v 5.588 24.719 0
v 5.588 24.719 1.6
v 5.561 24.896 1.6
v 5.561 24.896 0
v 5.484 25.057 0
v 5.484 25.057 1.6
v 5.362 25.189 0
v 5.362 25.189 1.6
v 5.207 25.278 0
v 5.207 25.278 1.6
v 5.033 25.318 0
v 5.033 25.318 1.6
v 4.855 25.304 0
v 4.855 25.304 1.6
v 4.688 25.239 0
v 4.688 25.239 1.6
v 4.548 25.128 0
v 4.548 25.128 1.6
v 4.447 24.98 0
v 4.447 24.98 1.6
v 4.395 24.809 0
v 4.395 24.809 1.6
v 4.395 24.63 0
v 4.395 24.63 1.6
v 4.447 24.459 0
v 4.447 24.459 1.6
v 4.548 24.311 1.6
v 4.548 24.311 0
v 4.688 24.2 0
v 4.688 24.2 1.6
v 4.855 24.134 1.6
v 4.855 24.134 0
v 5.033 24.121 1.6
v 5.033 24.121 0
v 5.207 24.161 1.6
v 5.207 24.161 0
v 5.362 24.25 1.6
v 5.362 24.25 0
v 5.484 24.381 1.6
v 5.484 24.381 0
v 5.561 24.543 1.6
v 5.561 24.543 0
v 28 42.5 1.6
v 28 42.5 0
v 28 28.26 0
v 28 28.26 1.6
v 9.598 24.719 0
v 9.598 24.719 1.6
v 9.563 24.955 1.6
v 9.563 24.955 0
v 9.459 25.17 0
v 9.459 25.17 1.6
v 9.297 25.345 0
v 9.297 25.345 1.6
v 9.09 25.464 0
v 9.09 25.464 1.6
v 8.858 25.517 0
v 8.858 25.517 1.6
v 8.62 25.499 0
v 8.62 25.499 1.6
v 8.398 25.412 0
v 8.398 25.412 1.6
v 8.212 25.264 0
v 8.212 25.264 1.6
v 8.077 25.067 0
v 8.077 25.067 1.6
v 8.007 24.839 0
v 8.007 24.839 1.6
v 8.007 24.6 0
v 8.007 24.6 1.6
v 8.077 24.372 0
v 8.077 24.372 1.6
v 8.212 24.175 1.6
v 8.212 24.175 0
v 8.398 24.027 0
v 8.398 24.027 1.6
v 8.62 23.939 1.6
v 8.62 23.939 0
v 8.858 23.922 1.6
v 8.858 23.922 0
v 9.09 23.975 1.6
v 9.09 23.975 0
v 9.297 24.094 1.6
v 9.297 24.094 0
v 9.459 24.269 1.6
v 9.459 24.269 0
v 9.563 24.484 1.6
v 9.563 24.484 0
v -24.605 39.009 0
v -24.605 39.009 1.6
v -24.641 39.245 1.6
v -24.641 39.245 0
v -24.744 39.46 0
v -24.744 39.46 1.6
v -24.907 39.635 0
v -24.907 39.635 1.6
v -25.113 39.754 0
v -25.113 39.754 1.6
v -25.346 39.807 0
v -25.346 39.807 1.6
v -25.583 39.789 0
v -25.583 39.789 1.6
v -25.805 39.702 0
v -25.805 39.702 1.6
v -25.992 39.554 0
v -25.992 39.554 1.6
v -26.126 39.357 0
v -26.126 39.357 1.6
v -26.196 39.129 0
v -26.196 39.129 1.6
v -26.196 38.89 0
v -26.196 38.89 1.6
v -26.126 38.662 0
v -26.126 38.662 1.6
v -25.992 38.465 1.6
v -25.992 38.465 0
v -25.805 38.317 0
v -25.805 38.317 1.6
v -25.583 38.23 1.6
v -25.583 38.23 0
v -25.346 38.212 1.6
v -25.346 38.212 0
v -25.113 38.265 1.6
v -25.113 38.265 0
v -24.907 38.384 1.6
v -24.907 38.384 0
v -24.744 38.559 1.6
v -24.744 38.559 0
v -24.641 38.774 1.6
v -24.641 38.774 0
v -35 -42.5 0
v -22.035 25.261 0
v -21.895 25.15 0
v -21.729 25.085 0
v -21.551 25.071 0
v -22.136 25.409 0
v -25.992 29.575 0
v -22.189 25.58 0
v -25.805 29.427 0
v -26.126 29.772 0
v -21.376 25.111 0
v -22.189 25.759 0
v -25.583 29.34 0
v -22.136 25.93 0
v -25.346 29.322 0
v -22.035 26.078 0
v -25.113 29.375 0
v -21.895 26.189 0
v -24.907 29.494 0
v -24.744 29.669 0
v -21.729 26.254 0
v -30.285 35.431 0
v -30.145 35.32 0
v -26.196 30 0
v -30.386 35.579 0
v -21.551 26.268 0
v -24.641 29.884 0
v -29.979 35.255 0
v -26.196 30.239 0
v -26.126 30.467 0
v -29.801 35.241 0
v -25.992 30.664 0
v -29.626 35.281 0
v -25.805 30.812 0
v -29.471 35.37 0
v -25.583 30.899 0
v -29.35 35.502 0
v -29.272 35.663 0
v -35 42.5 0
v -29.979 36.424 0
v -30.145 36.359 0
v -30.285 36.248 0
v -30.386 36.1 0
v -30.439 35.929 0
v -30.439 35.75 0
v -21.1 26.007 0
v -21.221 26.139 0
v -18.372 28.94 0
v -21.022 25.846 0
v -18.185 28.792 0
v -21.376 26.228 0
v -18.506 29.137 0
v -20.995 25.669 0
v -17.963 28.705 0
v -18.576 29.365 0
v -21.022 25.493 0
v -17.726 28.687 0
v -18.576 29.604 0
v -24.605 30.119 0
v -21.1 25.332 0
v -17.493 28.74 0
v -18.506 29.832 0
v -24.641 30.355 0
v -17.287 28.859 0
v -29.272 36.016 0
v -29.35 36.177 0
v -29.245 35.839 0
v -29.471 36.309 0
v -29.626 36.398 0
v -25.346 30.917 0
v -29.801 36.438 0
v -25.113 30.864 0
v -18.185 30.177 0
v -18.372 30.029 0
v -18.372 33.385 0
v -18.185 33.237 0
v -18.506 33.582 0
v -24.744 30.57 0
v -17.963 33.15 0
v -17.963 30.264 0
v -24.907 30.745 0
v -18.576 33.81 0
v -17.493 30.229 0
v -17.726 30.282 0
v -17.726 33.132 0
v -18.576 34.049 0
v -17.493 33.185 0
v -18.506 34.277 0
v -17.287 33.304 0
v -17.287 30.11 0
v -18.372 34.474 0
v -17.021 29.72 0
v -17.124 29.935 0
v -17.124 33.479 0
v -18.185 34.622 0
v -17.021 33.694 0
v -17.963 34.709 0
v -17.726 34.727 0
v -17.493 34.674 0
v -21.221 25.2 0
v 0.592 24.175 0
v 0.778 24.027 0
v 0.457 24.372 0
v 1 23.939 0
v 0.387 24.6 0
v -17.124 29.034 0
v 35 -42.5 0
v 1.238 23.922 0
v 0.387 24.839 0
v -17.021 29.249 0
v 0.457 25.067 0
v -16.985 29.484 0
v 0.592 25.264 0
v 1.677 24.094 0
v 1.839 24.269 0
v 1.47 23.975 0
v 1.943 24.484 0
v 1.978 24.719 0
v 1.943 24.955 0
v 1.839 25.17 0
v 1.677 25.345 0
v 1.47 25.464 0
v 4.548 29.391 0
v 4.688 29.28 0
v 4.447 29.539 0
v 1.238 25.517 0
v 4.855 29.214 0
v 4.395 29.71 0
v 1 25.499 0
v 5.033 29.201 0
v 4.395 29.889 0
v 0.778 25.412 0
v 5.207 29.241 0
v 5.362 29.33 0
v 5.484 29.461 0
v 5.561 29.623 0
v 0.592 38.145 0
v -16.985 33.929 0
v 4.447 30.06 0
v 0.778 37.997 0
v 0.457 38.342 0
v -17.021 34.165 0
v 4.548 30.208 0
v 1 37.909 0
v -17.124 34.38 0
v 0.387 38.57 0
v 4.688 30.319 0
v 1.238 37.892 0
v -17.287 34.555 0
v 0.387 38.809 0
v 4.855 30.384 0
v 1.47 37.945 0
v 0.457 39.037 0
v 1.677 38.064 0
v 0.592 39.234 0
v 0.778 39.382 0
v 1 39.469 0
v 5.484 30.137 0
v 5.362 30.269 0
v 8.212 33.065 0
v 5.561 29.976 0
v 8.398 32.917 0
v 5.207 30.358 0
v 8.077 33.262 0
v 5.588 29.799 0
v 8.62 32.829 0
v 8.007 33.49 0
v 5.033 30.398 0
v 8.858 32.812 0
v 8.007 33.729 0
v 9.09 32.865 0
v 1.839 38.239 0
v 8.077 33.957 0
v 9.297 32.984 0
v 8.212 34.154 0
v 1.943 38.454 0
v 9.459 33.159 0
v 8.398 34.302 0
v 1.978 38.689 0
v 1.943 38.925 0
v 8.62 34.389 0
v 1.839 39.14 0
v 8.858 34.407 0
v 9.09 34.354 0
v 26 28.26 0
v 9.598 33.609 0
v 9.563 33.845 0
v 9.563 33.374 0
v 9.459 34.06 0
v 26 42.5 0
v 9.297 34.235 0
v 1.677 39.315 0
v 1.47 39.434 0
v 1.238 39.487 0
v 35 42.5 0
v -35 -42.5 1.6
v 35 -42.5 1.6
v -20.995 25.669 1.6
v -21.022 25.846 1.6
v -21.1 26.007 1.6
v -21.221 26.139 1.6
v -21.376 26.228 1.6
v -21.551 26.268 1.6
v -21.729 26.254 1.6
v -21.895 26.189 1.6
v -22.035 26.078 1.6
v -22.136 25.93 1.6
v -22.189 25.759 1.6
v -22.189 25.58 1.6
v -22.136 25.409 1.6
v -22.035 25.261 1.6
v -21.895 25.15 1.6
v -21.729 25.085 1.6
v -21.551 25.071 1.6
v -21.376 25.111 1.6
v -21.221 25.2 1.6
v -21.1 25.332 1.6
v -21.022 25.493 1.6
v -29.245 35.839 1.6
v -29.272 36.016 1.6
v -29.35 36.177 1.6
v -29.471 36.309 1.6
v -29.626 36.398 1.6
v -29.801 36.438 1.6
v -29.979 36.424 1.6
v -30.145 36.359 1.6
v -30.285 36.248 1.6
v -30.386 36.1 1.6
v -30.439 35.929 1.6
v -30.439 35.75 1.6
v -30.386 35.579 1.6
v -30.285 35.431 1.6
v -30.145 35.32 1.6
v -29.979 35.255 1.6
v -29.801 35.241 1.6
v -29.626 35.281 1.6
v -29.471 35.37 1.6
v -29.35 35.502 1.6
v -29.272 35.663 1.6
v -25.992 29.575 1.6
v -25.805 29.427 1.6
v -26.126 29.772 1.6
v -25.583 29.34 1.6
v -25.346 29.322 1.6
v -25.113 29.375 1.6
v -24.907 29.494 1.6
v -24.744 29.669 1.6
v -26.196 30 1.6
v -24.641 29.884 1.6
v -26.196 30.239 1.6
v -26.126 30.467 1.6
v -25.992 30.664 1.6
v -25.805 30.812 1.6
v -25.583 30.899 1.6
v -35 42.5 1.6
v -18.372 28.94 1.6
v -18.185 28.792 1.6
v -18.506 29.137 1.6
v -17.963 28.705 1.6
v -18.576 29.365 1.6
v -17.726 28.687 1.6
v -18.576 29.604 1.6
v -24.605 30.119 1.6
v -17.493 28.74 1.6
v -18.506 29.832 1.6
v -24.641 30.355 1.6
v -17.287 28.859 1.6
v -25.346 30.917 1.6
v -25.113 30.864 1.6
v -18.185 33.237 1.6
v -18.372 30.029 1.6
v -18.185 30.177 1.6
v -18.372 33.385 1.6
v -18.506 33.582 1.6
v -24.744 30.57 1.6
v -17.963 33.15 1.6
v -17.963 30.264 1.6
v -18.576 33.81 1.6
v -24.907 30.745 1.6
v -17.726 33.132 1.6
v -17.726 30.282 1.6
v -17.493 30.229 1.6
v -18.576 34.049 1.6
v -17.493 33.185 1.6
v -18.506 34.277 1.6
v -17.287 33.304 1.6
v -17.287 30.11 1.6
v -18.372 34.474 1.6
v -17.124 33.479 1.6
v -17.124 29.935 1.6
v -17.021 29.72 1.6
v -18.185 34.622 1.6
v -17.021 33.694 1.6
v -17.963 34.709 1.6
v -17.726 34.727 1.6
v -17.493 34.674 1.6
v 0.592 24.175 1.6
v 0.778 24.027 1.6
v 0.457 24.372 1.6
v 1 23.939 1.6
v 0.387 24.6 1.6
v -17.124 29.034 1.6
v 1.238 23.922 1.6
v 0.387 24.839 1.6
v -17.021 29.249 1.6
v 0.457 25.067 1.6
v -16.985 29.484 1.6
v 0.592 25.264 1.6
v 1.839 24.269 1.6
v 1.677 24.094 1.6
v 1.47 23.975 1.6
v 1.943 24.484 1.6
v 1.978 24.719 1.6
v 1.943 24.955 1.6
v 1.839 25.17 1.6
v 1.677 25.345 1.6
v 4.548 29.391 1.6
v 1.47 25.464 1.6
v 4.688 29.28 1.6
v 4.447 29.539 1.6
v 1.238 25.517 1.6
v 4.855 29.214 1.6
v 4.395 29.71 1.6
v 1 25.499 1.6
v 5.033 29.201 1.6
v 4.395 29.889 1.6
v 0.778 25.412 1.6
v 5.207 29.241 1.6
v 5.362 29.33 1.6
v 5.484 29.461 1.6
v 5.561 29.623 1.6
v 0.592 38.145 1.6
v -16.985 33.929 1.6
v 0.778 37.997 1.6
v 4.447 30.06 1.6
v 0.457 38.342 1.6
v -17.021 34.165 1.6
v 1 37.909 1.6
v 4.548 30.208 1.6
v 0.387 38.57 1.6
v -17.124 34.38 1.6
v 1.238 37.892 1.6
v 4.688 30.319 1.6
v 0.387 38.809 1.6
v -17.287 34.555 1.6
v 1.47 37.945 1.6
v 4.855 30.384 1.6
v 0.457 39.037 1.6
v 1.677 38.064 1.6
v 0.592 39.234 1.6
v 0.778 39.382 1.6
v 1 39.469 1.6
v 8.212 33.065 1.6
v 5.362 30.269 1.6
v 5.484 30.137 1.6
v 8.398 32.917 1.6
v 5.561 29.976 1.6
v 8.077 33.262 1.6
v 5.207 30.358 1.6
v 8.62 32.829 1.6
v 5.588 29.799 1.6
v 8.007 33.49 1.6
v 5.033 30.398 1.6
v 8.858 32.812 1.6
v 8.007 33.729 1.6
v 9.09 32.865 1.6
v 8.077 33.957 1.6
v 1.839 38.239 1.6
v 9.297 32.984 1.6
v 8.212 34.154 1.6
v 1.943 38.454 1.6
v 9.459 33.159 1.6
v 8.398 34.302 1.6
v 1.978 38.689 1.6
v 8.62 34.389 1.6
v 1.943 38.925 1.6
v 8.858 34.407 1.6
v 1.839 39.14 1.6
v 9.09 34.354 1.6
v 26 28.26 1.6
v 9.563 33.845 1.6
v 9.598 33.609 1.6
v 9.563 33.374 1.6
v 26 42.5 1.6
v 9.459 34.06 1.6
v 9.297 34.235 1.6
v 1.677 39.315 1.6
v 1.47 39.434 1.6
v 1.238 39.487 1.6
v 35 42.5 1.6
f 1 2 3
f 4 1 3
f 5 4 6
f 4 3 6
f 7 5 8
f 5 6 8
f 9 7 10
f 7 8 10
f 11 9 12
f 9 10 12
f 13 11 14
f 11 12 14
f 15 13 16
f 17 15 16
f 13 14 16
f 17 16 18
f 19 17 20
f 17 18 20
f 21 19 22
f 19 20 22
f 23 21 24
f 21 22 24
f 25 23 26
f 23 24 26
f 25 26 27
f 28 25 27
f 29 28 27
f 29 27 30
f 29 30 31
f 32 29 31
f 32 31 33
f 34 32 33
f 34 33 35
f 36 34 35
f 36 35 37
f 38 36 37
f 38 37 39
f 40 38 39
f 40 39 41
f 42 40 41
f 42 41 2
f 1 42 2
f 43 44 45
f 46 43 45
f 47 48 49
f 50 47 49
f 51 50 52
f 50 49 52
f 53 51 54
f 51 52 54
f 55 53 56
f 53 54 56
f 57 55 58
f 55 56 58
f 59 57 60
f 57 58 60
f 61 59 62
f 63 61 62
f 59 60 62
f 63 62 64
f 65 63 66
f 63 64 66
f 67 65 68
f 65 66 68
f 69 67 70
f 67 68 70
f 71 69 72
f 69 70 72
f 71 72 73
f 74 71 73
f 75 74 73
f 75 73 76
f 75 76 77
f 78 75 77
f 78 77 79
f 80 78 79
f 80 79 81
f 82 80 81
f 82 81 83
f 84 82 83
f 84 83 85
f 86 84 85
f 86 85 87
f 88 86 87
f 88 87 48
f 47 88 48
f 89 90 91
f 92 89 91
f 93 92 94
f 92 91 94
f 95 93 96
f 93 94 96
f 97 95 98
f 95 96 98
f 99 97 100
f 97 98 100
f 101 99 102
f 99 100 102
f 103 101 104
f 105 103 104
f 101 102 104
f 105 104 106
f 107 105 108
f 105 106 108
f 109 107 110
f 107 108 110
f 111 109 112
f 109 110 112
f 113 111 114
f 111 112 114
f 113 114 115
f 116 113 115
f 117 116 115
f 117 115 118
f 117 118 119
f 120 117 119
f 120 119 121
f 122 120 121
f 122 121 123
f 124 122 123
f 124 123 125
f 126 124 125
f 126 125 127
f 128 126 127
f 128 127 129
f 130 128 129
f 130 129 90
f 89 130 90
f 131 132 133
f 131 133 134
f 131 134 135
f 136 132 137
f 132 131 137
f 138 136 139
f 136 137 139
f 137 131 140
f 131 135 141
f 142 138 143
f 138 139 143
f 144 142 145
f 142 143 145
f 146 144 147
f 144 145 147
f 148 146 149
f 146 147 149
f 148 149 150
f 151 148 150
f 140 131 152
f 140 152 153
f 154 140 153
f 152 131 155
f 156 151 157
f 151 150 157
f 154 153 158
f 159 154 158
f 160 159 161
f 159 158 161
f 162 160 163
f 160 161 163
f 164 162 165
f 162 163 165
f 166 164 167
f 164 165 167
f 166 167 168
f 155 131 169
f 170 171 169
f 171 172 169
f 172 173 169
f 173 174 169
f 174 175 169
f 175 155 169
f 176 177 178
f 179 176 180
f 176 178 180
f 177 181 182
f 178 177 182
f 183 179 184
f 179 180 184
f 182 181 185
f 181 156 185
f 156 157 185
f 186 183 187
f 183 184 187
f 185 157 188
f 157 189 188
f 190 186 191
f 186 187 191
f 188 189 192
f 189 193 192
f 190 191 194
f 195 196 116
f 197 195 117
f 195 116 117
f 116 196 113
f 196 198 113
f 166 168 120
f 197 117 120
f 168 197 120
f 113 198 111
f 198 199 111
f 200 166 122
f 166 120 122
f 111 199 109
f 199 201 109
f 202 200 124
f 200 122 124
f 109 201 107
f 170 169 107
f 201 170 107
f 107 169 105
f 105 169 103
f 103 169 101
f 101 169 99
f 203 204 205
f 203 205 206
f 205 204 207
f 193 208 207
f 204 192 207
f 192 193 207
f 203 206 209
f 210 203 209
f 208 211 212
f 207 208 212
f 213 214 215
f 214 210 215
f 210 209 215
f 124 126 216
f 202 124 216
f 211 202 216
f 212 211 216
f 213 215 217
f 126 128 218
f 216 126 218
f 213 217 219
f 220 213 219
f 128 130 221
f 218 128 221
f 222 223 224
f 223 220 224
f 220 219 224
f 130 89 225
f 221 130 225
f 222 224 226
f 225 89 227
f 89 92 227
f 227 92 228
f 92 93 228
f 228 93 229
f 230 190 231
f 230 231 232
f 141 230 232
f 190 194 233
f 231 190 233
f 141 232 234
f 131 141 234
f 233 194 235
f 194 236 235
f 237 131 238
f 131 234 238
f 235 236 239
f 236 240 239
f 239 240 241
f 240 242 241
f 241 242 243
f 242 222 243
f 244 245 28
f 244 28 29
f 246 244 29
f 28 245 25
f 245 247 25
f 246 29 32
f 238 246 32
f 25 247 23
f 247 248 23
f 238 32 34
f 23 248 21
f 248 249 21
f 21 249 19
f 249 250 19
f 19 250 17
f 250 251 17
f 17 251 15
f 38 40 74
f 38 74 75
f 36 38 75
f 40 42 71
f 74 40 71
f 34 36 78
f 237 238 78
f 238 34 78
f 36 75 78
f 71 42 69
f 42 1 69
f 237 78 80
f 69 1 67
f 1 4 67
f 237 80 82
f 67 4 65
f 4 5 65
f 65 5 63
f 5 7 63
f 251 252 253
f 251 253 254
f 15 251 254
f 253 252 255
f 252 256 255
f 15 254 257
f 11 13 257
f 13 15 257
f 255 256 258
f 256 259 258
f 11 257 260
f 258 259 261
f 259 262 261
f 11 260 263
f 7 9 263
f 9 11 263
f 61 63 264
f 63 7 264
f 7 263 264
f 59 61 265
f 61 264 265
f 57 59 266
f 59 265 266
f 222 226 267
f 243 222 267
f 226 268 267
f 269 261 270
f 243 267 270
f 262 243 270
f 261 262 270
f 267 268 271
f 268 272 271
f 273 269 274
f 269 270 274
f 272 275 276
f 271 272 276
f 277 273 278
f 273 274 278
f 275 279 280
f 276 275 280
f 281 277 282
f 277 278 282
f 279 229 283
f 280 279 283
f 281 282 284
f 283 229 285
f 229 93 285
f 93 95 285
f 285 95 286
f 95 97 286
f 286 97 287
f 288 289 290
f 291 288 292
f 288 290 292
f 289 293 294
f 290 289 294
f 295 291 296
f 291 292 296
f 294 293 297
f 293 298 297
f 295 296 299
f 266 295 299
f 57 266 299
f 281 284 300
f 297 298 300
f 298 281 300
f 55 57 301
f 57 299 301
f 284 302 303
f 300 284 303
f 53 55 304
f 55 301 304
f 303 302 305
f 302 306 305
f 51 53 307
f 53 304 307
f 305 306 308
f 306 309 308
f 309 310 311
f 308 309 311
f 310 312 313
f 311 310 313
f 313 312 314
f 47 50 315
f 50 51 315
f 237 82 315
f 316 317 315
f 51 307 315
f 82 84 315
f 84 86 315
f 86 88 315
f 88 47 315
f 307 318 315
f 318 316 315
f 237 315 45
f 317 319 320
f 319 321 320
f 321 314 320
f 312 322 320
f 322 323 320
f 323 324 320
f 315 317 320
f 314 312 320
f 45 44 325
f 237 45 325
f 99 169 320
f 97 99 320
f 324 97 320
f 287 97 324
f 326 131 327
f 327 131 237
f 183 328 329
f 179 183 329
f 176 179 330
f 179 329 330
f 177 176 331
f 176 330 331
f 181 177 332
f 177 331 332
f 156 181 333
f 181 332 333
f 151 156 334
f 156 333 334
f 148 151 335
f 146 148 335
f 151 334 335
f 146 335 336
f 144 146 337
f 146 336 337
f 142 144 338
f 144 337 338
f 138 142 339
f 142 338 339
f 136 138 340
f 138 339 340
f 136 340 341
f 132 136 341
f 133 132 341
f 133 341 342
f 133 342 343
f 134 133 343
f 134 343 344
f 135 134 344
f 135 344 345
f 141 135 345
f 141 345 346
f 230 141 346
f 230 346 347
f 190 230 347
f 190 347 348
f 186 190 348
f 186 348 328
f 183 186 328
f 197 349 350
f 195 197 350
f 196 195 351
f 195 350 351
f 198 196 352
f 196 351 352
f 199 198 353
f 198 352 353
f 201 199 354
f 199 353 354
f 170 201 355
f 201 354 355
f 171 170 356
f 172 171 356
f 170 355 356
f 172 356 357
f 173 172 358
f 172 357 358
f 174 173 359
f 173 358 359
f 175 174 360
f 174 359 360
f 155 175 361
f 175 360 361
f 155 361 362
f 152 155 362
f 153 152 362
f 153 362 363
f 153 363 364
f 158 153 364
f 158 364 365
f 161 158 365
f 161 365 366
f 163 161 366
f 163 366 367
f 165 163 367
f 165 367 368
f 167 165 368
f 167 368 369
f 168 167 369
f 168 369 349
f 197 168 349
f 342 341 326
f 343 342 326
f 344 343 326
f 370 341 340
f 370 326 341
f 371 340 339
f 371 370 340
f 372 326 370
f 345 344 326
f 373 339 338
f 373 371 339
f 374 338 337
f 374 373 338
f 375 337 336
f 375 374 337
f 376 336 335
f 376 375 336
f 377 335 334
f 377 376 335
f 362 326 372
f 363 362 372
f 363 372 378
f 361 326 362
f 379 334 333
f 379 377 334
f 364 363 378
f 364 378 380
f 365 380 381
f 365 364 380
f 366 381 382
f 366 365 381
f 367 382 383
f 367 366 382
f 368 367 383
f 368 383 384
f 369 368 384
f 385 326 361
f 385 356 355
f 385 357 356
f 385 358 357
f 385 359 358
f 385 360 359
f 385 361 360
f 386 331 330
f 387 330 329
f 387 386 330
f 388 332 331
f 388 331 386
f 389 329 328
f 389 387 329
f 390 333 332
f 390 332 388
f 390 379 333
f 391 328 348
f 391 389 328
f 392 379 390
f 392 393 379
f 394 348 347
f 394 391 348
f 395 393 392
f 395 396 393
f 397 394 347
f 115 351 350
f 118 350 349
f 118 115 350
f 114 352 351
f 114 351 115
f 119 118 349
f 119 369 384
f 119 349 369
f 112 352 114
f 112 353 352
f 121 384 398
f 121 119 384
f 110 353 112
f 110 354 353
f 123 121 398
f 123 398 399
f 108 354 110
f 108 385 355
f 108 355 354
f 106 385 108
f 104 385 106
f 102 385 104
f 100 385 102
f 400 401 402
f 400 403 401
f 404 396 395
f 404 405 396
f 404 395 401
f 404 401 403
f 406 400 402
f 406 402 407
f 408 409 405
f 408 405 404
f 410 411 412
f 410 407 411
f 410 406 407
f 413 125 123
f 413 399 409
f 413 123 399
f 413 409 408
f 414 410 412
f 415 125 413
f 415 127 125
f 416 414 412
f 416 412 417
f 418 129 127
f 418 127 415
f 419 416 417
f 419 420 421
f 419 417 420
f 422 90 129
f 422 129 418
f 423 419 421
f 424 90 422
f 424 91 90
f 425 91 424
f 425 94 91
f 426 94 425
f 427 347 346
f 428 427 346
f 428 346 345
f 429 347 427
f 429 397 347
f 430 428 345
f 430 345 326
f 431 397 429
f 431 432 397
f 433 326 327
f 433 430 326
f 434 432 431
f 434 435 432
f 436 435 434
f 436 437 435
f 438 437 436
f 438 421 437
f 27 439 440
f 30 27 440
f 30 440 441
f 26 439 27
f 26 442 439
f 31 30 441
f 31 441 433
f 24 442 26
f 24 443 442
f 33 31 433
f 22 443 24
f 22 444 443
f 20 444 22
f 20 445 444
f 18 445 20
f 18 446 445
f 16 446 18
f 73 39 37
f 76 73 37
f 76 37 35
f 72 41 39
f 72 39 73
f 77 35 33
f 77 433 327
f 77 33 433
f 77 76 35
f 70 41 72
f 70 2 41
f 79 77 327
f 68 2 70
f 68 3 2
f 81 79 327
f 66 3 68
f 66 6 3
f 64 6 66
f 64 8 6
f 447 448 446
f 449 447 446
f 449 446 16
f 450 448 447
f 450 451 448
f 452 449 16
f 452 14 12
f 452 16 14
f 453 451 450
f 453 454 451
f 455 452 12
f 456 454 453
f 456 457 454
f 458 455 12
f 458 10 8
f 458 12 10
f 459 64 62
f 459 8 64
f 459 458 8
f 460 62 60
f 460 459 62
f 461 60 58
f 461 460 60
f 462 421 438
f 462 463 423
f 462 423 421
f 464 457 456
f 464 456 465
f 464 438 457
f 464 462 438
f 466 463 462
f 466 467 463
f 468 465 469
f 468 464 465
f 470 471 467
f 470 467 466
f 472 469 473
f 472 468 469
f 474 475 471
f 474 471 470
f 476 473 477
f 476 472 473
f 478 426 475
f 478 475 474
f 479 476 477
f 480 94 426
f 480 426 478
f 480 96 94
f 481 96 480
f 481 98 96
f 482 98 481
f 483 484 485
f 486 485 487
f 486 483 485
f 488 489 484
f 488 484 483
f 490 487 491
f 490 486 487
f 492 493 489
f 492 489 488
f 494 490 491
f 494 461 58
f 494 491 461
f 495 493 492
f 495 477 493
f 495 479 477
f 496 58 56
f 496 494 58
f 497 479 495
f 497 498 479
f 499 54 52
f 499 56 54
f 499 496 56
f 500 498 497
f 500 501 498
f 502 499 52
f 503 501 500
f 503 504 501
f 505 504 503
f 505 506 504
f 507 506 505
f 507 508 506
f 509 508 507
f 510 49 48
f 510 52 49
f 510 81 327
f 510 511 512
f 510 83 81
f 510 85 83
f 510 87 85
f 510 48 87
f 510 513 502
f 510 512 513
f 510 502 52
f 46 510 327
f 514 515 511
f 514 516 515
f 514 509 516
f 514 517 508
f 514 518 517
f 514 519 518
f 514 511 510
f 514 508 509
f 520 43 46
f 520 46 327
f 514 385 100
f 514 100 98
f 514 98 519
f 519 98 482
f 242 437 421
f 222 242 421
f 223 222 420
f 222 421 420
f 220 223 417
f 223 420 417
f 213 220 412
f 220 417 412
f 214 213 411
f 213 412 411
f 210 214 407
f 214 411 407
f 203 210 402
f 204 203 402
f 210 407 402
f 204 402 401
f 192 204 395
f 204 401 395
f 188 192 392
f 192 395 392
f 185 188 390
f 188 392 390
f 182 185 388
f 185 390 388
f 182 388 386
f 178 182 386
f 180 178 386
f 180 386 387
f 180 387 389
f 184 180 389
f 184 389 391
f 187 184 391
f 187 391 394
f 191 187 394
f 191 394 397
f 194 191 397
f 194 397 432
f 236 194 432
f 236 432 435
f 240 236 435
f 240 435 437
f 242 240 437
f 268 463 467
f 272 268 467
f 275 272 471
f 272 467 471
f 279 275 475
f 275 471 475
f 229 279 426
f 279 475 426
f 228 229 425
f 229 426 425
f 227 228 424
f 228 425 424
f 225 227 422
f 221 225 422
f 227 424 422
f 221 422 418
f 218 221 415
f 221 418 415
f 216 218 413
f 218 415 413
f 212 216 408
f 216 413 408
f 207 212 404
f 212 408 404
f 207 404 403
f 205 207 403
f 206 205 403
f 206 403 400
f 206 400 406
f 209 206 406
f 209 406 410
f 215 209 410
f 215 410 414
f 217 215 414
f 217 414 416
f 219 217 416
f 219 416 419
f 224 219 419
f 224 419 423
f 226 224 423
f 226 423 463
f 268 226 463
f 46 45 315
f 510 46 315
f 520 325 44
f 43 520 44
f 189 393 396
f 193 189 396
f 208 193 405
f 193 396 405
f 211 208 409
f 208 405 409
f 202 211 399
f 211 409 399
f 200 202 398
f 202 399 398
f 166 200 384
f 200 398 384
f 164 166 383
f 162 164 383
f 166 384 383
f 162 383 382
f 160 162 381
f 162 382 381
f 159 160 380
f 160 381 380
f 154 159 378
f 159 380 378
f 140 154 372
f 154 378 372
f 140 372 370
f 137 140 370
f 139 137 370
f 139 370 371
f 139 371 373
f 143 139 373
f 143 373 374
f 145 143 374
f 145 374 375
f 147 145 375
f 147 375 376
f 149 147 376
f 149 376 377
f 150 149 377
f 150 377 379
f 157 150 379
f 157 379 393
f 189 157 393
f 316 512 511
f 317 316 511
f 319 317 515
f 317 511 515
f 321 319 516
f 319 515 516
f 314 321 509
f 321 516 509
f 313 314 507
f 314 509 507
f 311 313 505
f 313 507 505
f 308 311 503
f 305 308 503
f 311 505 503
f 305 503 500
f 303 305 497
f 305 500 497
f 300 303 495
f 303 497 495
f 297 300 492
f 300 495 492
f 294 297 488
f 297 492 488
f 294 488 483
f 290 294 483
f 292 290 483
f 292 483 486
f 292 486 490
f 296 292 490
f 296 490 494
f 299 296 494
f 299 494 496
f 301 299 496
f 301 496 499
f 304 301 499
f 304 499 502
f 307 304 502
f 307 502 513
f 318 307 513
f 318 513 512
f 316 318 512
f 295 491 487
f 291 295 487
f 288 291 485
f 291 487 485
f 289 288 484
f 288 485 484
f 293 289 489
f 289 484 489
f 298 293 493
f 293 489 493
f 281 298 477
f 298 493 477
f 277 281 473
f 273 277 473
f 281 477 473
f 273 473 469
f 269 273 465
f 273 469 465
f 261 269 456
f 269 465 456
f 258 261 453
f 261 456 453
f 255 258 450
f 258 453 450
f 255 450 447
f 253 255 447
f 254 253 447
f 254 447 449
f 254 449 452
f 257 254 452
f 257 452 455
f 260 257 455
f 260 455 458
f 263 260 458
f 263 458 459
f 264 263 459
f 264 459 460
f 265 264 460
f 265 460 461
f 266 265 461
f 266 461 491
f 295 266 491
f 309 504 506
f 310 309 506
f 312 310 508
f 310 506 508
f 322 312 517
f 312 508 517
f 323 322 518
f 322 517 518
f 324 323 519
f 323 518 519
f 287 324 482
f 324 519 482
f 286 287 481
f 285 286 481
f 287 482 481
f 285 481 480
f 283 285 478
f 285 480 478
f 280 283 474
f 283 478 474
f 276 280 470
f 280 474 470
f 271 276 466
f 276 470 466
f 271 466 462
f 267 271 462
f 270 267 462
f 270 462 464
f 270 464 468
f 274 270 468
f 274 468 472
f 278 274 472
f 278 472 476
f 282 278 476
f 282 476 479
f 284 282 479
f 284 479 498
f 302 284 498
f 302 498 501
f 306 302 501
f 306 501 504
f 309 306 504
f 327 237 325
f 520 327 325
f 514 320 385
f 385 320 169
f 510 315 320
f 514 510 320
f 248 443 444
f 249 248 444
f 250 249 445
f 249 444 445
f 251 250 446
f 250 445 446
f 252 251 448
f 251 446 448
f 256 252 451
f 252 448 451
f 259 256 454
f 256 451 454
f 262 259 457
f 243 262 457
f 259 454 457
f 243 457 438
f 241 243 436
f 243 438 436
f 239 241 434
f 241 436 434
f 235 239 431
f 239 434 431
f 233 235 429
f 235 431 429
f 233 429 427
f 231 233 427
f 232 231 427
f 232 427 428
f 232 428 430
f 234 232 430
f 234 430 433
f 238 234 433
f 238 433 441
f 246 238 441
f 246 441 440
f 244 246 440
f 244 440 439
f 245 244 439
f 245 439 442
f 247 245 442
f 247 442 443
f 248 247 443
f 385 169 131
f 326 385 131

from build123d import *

# Parameters (mm, degrees)
BOSS_EXTRUDE1_DEPTH = 1.6
SKETCH2_R           = 0.6
SKETCH2_R_2         = 0.8
CUT_EXTRUDE1_DEPTH  = 56.08003268


with BuildPart() as part:
    # Sketch1 → Boss-Extrude1 (new body)
    with BuildSketch(Plane.XY):
        Polygon((28, 42.5), (28, 28.26), (26, 28.26), (26, 42.5), (-35, 42.5), (-35, -42.5), (35, -42.5), (35, 42.5), align=None)
    extrude(amount=BOSS_EXTRUDE1_DEPTH)

    # Sketch2 → Cut-Extrude1 (cut, through all)
    with BuildSketch(Plane.XY.offset(1.6)):
        with Locations((-21.595341155, 25.669496774)):
            Circle(SKETCH2_R)
        with Locations((-17.785341155, 29.484496774)):
            Circle(SKETCH2_R_2)
        with Locations((-25.405341155, 30.119496774)):
            Circle(SKETCH2_R_2)
        with Locations((-17.785341155, 33.929496774)):
            Circle(SKETCH2_R_2)
        with Locations((-25.405341155, 39.009496774)):
            Circle(SKETCH2_R_2)
        with Locations((-29.845341155, 35.839496774)):
            Circle(SKETCH2_R)
        with Locations((4.98804487, 24.719413951)):
            Circle(SKETCH2_R)
        with Locations((8.79804487, 24.719413951)):
            Circle(SKETCH2_R_2)
        with Locations((1.17804487, 24.719413951)):
            Circle(SKETCH2_R_2)
        with Locations((4.98804487, 29.799413951)):
            Circle(SKETCH2_R)
        with Locations((8.79804487, 33.609413951)):
            Circle(SKETCH2_R_2)
        with Locations((1.17804487, 38.689413951)):
            Circle(SKETCH2_R_2)
    extrude(amount=-CUT_EXTRUDE1_DEPTH, mode=Mode.SUBTRACT)


solid = part.part
